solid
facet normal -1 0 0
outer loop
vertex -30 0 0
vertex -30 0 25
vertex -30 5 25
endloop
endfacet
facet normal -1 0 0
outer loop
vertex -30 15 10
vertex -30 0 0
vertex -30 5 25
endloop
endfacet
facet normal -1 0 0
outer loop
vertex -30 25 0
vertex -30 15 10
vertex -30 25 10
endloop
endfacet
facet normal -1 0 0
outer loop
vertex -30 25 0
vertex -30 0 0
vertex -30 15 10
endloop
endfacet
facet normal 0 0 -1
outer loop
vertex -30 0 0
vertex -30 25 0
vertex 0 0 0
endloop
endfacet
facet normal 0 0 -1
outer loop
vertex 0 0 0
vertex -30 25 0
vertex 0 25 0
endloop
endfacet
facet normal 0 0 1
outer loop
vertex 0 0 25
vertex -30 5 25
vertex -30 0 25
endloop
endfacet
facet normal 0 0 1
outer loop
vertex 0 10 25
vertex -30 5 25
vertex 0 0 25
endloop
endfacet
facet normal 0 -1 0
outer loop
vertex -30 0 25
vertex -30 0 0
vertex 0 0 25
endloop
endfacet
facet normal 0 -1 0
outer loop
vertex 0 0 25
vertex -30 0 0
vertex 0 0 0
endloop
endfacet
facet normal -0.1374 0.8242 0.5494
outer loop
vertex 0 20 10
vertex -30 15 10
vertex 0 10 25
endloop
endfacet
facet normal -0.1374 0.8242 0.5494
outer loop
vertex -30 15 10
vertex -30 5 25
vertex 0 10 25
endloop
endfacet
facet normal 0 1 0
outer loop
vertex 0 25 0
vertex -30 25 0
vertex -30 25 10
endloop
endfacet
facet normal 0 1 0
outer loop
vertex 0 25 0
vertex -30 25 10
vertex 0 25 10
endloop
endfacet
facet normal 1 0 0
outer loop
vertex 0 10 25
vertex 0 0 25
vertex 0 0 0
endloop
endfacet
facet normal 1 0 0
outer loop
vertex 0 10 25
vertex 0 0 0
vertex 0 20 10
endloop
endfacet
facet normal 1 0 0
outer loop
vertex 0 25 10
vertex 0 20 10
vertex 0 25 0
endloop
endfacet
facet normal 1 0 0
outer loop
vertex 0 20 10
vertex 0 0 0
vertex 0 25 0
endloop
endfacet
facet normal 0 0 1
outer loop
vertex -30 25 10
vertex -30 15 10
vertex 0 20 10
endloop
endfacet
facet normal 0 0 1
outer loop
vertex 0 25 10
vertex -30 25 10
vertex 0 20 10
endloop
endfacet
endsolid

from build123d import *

# Parameters (mm, degrees)
SKETCH1_W           = 30
SKETCH1_H           = 25
BOSS_EXTRUDE1_DEPTH = 25
CUT_EXTRUDE4_DEPTH  = 25


with BuildPart() as part:
    # Sketch1 → Boss-Extrude1 (new body)
    with BuildSketch(Plane.XY):
        with Locations((-15, 12.5)):
            Rectangle(SKETCH1_W, SKETCH1_H)
    extrude(amount=BOSS_EXTRUDE1_DEPTH)

    # 3DSketch1 → Cut-Extrude4 (cut, along a direction that is not the sketch's normal)
    with BuildSketch(Plane(origin=(-30, 15, 10), x_dir=(0.8846517369293828, -0.14744195615489716, 0.4423258684646914), z_dir=(0.13736056394868915, -0.824163383692134, -0.5494422557947564))):
        Polygon((0, 0), (25.802342327, -16.100904646), (33.911649916, 0), (8.109307589, 16.100904646), align=None)
    extrude(amount=-CUT_EXTRUDE4_DEPTH, dir=(0, -1, 0), mode=Mode.SUBTRACT)


solid = part.part
